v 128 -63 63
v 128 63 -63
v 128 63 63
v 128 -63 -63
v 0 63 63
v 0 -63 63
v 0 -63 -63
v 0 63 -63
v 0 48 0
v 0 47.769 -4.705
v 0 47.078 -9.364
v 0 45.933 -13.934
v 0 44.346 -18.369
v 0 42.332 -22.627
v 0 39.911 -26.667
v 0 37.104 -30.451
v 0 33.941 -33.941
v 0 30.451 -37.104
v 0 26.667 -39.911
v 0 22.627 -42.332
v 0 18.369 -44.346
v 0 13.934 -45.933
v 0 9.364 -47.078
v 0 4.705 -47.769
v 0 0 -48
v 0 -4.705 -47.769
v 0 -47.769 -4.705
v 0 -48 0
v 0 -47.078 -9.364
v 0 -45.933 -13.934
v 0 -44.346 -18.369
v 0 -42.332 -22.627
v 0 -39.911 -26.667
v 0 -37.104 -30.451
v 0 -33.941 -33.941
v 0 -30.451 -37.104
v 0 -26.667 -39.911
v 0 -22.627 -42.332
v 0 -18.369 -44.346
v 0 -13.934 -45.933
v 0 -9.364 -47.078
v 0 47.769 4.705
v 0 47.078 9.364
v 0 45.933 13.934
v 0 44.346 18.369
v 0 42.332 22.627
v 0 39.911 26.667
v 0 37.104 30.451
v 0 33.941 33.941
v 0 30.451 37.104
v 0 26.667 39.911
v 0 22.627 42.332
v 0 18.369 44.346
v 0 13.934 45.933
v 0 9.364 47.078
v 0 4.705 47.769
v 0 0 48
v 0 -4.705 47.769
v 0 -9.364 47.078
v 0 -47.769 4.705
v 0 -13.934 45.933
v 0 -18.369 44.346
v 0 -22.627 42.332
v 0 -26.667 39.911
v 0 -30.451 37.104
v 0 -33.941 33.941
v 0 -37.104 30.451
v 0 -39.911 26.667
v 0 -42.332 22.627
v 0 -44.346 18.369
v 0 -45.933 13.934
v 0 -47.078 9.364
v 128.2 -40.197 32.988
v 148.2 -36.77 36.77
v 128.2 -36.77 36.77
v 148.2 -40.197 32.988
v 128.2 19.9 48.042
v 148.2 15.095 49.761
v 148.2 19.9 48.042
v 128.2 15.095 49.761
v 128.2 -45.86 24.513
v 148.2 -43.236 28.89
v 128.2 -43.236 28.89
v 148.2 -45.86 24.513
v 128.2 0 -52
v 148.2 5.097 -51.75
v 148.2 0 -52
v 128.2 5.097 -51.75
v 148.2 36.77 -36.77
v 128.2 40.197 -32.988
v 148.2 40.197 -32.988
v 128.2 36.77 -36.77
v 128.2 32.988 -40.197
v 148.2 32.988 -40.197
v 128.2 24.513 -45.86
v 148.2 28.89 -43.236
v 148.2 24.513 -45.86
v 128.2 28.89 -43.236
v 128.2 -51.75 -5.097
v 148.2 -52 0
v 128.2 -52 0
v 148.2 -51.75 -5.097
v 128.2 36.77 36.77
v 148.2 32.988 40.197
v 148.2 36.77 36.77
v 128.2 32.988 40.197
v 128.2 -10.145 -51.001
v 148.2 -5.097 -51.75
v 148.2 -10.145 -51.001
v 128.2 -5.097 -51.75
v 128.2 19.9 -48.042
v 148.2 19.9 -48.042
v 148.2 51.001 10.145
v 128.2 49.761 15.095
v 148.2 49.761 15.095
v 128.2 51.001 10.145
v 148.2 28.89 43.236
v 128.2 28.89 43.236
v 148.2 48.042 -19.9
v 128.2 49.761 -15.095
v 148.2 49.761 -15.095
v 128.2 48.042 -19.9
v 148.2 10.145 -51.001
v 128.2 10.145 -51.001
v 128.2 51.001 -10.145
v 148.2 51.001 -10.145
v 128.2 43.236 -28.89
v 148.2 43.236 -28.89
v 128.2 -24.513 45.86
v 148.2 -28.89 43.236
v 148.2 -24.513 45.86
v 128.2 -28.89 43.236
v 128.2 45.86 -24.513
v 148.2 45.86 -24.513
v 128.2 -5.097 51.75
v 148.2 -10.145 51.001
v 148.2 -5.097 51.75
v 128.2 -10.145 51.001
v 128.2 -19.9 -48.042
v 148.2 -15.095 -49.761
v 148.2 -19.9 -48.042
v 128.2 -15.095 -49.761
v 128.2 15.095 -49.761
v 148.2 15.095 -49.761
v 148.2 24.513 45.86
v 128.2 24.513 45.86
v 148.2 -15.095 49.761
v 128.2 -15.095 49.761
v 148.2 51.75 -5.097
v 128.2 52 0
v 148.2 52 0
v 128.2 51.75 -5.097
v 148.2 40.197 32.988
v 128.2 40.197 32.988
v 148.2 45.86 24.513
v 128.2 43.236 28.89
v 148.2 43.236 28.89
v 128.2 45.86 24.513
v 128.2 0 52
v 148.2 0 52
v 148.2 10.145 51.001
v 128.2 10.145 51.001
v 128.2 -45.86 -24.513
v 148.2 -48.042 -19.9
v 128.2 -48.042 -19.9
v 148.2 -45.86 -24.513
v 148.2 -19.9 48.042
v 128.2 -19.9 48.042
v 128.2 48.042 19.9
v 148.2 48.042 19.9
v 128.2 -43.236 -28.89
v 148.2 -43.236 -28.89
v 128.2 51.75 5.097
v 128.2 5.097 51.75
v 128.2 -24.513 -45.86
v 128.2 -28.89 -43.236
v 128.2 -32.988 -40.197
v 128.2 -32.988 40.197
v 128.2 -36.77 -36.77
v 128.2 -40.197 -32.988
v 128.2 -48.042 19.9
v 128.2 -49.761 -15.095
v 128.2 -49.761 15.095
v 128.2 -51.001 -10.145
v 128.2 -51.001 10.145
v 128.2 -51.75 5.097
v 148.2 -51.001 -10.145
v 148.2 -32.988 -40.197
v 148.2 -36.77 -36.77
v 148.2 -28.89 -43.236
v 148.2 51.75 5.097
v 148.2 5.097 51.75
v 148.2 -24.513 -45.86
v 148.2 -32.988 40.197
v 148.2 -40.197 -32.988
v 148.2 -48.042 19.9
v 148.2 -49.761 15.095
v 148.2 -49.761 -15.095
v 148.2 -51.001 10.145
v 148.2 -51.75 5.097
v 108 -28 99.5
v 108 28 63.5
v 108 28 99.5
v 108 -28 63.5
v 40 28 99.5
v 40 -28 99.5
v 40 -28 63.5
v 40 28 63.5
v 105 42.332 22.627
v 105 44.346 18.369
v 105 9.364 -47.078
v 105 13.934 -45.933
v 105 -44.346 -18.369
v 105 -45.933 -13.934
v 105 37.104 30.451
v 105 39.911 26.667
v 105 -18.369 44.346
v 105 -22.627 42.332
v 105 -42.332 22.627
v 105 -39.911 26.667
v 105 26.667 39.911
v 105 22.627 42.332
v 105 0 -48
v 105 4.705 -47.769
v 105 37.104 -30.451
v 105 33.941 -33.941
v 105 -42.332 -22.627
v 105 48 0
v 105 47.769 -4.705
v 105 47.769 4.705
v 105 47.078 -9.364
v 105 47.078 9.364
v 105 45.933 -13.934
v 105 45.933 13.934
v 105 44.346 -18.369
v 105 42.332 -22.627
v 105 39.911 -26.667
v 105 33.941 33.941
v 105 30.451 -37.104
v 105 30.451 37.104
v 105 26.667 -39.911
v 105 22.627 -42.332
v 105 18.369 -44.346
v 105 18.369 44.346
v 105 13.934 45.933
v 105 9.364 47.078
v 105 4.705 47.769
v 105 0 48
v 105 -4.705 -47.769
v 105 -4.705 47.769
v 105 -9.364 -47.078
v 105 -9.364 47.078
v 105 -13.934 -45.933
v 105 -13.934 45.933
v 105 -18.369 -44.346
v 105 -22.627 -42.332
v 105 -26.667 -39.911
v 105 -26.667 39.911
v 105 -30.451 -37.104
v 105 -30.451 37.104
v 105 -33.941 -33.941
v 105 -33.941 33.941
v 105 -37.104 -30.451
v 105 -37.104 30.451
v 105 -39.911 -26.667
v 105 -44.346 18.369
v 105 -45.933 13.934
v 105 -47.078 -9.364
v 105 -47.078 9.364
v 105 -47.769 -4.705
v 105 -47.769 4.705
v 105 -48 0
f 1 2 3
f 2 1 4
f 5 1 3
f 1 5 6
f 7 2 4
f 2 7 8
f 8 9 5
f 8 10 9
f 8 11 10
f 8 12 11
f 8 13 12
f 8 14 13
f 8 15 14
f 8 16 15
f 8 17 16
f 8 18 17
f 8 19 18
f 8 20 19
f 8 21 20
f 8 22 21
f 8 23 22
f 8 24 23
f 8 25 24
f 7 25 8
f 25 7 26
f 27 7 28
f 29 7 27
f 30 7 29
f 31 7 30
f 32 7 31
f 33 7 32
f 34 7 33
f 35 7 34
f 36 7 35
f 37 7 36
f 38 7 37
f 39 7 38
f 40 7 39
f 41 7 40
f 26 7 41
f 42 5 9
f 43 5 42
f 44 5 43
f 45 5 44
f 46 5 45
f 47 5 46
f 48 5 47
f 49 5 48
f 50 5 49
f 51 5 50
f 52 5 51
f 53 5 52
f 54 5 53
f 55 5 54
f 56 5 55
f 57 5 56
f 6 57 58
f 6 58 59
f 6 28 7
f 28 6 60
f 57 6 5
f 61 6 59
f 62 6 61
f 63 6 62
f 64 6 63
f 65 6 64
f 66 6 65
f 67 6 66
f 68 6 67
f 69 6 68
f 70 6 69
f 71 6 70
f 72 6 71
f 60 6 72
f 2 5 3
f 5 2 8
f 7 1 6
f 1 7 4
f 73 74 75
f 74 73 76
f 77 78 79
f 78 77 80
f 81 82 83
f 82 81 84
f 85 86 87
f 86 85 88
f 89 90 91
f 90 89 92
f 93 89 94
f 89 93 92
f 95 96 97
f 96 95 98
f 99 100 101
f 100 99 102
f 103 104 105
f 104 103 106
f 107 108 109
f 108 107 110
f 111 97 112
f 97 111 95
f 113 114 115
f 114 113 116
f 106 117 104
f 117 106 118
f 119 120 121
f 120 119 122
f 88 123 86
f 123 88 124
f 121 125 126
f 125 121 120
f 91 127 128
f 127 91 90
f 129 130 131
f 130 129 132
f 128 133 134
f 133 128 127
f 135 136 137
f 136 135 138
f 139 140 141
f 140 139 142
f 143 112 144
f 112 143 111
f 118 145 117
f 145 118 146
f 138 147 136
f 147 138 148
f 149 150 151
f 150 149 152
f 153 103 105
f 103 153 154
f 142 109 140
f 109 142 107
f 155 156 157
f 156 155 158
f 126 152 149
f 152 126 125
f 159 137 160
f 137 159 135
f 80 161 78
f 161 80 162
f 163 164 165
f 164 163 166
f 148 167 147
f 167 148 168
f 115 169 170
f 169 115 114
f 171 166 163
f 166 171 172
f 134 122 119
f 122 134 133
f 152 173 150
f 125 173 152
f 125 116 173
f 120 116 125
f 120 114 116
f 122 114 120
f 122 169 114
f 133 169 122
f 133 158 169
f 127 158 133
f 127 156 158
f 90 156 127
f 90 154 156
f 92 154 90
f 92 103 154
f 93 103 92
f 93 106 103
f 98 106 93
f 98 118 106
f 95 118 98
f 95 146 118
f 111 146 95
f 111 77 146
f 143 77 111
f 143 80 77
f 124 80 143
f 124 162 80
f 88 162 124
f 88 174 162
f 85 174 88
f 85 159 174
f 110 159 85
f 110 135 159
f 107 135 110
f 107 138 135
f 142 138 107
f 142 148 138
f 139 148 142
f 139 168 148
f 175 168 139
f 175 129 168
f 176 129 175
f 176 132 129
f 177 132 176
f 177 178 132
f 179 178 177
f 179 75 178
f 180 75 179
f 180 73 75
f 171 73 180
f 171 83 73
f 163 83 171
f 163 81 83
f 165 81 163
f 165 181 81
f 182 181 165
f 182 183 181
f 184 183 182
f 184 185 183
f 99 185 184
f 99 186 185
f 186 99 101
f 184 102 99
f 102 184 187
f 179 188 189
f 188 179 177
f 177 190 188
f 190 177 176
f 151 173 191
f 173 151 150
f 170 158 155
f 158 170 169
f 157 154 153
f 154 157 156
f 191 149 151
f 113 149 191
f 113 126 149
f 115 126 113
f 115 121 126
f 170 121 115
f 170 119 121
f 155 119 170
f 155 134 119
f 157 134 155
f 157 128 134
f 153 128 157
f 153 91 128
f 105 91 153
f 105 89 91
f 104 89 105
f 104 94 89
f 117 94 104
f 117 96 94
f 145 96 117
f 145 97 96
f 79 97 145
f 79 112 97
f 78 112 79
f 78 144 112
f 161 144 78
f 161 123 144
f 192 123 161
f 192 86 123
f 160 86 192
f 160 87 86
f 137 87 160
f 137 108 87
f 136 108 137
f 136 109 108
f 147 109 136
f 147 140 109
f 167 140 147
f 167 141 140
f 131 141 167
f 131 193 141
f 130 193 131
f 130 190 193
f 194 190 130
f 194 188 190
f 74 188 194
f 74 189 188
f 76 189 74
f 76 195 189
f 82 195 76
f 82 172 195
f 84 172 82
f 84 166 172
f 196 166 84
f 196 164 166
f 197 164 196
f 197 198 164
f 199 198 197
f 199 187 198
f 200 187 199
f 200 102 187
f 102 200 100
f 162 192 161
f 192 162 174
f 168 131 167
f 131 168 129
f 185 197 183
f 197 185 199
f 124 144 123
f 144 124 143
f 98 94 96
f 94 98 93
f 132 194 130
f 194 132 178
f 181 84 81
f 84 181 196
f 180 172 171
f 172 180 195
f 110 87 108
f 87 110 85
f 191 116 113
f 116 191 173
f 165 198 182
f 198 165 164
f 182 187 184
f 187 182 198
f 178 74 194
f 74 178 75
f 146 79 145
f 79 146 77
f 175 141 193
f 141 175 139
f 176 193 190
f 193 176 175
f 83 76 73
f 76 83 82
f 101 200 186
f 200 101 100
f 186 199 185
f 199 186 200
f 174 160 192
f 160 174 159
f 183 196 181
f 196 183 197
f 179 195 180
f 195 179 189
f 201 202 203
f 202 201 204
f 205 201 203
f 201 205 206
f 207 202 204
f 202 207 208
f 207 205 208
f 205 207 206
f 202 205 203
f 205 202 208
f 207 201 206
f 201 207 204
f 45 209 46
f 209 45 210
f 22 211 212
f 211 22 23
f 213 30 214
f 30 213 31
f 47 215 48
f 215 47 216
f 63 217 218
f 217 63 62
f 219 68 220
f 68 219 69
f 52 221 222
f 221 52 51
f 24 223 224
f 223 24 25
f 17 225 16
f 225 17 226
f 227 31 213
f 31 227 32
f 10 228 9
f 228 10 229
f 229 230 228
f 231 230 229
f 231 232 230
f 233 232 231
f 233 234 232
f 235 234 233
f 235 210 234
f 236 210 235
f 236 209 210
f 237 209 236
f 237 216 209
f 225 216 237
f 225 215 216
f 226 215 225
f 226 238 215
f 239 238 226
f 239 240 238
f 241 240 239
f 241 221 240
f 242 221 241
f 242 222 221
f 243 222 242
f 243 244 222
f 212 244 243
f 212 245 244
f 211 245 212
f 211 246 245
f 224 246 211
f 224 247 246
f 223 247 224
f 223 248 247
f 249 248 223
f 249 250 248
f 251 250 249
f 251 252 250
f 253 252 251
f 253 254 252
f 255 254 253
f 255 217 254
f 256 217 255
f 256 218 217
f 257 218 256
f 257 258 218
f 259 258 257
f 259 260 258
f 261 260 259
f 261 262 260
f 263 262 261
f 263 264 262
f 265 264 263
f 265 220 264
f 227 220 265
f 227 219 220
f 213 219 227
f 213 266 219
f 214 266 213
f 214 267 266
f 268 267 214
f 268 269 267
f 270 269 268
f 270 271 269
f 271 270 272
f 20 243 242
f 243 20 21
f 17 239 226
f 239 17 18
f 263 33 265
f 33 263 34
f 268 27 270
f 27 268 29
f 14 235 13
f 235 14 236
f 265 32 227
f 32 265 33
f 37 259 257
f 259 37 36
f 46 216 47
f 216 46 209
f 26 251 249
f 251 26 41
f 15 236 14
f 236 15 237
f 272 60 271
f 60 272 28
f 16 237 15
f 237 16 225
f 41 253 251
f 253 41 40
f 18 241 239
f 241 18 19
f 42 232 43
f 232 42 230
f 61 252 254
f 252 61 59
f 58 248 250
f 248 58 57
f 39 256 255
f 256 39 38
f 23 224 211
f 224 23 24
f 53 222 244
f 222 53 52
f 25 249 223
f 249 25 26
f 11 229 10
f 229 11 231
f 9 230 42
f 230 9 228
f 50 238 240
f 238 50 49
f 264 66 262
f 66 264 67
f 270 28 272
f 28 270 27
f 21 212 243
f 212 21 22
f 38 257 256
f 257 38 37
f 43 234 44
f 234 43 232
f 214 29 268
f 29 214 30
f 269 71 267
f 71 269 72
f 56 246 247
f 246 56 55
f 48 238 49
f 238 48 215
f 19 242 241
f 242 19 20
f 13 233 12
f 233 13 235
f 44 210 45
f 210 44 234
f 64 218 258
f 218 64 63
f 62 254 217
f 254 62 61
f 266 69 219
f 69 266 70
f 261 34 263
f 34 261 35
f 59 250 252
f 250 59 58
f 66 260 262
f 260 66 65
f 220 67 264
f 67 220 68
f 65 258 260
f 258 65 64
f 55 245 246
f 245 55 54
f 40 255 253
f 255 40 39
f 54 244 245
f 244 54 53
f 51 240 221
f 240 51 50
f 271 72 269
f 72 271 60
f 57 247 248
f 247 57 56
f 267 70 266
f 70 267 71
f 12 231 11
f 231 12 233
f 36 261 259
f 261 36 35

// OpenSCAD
// ============================================================================
// Atom Lithography Machine — Parametric OpenSCAD Module (S5.3-01)
// ============================================================================
// part_id           : S5.3-01
// parent_bom_id     : S5.3
// subsystem         : S5
// part_name         : Yerinde hizli termal / flas optik tavlama modulu (Exp66/91)
// material          : Al 6061
// temp_stage        : 300 K -> 1000 C (ms)
// vacuum_grade      : UHV (optik giris)
// tolerance         : ±5 C / ms darbe
// computed_mass_kg  : 3.60974
// envelope_mm       : 148.200 x 147.000 x 185.000
// design_maturity   : M0_M1_DETAILED_CAD_DESIGN_ONLY
// no_lab_measurement: true
// iec61508_certified: false
// semi_s2_certified : false
// Units: millimeters (mm)
// ============================================================================

$fn = 64;

// Nominal bounding envelope parameters (mm)
bbox_x = 148.2000;
bbox_y = 147.0000;
bbox_z = 185.0000;

// Part-specific parametric dimensions
head_l = 148.2;
aperture_d = 96.0;
pulse_ms = 1.0;

// Interface / port parameters (mm)
port_optical_exit_aperture_bore = 96.000;

module part_S5_3_01() {
  difference() {
    union() {
      // Finned Al-6061 Xe flash/RTA lamp housing
      translate([64.000, 0.000, 0.000]) cube([128.000, 126.000, 126.000], center=true);
      // Rear cooling blower shroud
      translate([138.200, 0.000, 0.000]) rotate([0.000, 90.000, 0.000]) cylinder(d=104.000, h=20.000, center=true);
      // HV Xe flash trigger transformer block
      translate([74.000, 0.000, 81.500]) cube([68.000, 56.000, 36.000], center=true);
    }
    // Elliptical optical reflector cavity
    translate([50.000, 0.000, 0.000]) rotate([0.000, 90.000, 0.000]) cylinder(d=96.000, h=110.000, center=true);
  }
}

// World assembly mounting transform (global machine frame, mm / deg):
// translate([-271.563, 227.868, 500.000]) rotate([0.000, 0.000, 140.000]) part_S5_3_01();

part_S5_3_01();
